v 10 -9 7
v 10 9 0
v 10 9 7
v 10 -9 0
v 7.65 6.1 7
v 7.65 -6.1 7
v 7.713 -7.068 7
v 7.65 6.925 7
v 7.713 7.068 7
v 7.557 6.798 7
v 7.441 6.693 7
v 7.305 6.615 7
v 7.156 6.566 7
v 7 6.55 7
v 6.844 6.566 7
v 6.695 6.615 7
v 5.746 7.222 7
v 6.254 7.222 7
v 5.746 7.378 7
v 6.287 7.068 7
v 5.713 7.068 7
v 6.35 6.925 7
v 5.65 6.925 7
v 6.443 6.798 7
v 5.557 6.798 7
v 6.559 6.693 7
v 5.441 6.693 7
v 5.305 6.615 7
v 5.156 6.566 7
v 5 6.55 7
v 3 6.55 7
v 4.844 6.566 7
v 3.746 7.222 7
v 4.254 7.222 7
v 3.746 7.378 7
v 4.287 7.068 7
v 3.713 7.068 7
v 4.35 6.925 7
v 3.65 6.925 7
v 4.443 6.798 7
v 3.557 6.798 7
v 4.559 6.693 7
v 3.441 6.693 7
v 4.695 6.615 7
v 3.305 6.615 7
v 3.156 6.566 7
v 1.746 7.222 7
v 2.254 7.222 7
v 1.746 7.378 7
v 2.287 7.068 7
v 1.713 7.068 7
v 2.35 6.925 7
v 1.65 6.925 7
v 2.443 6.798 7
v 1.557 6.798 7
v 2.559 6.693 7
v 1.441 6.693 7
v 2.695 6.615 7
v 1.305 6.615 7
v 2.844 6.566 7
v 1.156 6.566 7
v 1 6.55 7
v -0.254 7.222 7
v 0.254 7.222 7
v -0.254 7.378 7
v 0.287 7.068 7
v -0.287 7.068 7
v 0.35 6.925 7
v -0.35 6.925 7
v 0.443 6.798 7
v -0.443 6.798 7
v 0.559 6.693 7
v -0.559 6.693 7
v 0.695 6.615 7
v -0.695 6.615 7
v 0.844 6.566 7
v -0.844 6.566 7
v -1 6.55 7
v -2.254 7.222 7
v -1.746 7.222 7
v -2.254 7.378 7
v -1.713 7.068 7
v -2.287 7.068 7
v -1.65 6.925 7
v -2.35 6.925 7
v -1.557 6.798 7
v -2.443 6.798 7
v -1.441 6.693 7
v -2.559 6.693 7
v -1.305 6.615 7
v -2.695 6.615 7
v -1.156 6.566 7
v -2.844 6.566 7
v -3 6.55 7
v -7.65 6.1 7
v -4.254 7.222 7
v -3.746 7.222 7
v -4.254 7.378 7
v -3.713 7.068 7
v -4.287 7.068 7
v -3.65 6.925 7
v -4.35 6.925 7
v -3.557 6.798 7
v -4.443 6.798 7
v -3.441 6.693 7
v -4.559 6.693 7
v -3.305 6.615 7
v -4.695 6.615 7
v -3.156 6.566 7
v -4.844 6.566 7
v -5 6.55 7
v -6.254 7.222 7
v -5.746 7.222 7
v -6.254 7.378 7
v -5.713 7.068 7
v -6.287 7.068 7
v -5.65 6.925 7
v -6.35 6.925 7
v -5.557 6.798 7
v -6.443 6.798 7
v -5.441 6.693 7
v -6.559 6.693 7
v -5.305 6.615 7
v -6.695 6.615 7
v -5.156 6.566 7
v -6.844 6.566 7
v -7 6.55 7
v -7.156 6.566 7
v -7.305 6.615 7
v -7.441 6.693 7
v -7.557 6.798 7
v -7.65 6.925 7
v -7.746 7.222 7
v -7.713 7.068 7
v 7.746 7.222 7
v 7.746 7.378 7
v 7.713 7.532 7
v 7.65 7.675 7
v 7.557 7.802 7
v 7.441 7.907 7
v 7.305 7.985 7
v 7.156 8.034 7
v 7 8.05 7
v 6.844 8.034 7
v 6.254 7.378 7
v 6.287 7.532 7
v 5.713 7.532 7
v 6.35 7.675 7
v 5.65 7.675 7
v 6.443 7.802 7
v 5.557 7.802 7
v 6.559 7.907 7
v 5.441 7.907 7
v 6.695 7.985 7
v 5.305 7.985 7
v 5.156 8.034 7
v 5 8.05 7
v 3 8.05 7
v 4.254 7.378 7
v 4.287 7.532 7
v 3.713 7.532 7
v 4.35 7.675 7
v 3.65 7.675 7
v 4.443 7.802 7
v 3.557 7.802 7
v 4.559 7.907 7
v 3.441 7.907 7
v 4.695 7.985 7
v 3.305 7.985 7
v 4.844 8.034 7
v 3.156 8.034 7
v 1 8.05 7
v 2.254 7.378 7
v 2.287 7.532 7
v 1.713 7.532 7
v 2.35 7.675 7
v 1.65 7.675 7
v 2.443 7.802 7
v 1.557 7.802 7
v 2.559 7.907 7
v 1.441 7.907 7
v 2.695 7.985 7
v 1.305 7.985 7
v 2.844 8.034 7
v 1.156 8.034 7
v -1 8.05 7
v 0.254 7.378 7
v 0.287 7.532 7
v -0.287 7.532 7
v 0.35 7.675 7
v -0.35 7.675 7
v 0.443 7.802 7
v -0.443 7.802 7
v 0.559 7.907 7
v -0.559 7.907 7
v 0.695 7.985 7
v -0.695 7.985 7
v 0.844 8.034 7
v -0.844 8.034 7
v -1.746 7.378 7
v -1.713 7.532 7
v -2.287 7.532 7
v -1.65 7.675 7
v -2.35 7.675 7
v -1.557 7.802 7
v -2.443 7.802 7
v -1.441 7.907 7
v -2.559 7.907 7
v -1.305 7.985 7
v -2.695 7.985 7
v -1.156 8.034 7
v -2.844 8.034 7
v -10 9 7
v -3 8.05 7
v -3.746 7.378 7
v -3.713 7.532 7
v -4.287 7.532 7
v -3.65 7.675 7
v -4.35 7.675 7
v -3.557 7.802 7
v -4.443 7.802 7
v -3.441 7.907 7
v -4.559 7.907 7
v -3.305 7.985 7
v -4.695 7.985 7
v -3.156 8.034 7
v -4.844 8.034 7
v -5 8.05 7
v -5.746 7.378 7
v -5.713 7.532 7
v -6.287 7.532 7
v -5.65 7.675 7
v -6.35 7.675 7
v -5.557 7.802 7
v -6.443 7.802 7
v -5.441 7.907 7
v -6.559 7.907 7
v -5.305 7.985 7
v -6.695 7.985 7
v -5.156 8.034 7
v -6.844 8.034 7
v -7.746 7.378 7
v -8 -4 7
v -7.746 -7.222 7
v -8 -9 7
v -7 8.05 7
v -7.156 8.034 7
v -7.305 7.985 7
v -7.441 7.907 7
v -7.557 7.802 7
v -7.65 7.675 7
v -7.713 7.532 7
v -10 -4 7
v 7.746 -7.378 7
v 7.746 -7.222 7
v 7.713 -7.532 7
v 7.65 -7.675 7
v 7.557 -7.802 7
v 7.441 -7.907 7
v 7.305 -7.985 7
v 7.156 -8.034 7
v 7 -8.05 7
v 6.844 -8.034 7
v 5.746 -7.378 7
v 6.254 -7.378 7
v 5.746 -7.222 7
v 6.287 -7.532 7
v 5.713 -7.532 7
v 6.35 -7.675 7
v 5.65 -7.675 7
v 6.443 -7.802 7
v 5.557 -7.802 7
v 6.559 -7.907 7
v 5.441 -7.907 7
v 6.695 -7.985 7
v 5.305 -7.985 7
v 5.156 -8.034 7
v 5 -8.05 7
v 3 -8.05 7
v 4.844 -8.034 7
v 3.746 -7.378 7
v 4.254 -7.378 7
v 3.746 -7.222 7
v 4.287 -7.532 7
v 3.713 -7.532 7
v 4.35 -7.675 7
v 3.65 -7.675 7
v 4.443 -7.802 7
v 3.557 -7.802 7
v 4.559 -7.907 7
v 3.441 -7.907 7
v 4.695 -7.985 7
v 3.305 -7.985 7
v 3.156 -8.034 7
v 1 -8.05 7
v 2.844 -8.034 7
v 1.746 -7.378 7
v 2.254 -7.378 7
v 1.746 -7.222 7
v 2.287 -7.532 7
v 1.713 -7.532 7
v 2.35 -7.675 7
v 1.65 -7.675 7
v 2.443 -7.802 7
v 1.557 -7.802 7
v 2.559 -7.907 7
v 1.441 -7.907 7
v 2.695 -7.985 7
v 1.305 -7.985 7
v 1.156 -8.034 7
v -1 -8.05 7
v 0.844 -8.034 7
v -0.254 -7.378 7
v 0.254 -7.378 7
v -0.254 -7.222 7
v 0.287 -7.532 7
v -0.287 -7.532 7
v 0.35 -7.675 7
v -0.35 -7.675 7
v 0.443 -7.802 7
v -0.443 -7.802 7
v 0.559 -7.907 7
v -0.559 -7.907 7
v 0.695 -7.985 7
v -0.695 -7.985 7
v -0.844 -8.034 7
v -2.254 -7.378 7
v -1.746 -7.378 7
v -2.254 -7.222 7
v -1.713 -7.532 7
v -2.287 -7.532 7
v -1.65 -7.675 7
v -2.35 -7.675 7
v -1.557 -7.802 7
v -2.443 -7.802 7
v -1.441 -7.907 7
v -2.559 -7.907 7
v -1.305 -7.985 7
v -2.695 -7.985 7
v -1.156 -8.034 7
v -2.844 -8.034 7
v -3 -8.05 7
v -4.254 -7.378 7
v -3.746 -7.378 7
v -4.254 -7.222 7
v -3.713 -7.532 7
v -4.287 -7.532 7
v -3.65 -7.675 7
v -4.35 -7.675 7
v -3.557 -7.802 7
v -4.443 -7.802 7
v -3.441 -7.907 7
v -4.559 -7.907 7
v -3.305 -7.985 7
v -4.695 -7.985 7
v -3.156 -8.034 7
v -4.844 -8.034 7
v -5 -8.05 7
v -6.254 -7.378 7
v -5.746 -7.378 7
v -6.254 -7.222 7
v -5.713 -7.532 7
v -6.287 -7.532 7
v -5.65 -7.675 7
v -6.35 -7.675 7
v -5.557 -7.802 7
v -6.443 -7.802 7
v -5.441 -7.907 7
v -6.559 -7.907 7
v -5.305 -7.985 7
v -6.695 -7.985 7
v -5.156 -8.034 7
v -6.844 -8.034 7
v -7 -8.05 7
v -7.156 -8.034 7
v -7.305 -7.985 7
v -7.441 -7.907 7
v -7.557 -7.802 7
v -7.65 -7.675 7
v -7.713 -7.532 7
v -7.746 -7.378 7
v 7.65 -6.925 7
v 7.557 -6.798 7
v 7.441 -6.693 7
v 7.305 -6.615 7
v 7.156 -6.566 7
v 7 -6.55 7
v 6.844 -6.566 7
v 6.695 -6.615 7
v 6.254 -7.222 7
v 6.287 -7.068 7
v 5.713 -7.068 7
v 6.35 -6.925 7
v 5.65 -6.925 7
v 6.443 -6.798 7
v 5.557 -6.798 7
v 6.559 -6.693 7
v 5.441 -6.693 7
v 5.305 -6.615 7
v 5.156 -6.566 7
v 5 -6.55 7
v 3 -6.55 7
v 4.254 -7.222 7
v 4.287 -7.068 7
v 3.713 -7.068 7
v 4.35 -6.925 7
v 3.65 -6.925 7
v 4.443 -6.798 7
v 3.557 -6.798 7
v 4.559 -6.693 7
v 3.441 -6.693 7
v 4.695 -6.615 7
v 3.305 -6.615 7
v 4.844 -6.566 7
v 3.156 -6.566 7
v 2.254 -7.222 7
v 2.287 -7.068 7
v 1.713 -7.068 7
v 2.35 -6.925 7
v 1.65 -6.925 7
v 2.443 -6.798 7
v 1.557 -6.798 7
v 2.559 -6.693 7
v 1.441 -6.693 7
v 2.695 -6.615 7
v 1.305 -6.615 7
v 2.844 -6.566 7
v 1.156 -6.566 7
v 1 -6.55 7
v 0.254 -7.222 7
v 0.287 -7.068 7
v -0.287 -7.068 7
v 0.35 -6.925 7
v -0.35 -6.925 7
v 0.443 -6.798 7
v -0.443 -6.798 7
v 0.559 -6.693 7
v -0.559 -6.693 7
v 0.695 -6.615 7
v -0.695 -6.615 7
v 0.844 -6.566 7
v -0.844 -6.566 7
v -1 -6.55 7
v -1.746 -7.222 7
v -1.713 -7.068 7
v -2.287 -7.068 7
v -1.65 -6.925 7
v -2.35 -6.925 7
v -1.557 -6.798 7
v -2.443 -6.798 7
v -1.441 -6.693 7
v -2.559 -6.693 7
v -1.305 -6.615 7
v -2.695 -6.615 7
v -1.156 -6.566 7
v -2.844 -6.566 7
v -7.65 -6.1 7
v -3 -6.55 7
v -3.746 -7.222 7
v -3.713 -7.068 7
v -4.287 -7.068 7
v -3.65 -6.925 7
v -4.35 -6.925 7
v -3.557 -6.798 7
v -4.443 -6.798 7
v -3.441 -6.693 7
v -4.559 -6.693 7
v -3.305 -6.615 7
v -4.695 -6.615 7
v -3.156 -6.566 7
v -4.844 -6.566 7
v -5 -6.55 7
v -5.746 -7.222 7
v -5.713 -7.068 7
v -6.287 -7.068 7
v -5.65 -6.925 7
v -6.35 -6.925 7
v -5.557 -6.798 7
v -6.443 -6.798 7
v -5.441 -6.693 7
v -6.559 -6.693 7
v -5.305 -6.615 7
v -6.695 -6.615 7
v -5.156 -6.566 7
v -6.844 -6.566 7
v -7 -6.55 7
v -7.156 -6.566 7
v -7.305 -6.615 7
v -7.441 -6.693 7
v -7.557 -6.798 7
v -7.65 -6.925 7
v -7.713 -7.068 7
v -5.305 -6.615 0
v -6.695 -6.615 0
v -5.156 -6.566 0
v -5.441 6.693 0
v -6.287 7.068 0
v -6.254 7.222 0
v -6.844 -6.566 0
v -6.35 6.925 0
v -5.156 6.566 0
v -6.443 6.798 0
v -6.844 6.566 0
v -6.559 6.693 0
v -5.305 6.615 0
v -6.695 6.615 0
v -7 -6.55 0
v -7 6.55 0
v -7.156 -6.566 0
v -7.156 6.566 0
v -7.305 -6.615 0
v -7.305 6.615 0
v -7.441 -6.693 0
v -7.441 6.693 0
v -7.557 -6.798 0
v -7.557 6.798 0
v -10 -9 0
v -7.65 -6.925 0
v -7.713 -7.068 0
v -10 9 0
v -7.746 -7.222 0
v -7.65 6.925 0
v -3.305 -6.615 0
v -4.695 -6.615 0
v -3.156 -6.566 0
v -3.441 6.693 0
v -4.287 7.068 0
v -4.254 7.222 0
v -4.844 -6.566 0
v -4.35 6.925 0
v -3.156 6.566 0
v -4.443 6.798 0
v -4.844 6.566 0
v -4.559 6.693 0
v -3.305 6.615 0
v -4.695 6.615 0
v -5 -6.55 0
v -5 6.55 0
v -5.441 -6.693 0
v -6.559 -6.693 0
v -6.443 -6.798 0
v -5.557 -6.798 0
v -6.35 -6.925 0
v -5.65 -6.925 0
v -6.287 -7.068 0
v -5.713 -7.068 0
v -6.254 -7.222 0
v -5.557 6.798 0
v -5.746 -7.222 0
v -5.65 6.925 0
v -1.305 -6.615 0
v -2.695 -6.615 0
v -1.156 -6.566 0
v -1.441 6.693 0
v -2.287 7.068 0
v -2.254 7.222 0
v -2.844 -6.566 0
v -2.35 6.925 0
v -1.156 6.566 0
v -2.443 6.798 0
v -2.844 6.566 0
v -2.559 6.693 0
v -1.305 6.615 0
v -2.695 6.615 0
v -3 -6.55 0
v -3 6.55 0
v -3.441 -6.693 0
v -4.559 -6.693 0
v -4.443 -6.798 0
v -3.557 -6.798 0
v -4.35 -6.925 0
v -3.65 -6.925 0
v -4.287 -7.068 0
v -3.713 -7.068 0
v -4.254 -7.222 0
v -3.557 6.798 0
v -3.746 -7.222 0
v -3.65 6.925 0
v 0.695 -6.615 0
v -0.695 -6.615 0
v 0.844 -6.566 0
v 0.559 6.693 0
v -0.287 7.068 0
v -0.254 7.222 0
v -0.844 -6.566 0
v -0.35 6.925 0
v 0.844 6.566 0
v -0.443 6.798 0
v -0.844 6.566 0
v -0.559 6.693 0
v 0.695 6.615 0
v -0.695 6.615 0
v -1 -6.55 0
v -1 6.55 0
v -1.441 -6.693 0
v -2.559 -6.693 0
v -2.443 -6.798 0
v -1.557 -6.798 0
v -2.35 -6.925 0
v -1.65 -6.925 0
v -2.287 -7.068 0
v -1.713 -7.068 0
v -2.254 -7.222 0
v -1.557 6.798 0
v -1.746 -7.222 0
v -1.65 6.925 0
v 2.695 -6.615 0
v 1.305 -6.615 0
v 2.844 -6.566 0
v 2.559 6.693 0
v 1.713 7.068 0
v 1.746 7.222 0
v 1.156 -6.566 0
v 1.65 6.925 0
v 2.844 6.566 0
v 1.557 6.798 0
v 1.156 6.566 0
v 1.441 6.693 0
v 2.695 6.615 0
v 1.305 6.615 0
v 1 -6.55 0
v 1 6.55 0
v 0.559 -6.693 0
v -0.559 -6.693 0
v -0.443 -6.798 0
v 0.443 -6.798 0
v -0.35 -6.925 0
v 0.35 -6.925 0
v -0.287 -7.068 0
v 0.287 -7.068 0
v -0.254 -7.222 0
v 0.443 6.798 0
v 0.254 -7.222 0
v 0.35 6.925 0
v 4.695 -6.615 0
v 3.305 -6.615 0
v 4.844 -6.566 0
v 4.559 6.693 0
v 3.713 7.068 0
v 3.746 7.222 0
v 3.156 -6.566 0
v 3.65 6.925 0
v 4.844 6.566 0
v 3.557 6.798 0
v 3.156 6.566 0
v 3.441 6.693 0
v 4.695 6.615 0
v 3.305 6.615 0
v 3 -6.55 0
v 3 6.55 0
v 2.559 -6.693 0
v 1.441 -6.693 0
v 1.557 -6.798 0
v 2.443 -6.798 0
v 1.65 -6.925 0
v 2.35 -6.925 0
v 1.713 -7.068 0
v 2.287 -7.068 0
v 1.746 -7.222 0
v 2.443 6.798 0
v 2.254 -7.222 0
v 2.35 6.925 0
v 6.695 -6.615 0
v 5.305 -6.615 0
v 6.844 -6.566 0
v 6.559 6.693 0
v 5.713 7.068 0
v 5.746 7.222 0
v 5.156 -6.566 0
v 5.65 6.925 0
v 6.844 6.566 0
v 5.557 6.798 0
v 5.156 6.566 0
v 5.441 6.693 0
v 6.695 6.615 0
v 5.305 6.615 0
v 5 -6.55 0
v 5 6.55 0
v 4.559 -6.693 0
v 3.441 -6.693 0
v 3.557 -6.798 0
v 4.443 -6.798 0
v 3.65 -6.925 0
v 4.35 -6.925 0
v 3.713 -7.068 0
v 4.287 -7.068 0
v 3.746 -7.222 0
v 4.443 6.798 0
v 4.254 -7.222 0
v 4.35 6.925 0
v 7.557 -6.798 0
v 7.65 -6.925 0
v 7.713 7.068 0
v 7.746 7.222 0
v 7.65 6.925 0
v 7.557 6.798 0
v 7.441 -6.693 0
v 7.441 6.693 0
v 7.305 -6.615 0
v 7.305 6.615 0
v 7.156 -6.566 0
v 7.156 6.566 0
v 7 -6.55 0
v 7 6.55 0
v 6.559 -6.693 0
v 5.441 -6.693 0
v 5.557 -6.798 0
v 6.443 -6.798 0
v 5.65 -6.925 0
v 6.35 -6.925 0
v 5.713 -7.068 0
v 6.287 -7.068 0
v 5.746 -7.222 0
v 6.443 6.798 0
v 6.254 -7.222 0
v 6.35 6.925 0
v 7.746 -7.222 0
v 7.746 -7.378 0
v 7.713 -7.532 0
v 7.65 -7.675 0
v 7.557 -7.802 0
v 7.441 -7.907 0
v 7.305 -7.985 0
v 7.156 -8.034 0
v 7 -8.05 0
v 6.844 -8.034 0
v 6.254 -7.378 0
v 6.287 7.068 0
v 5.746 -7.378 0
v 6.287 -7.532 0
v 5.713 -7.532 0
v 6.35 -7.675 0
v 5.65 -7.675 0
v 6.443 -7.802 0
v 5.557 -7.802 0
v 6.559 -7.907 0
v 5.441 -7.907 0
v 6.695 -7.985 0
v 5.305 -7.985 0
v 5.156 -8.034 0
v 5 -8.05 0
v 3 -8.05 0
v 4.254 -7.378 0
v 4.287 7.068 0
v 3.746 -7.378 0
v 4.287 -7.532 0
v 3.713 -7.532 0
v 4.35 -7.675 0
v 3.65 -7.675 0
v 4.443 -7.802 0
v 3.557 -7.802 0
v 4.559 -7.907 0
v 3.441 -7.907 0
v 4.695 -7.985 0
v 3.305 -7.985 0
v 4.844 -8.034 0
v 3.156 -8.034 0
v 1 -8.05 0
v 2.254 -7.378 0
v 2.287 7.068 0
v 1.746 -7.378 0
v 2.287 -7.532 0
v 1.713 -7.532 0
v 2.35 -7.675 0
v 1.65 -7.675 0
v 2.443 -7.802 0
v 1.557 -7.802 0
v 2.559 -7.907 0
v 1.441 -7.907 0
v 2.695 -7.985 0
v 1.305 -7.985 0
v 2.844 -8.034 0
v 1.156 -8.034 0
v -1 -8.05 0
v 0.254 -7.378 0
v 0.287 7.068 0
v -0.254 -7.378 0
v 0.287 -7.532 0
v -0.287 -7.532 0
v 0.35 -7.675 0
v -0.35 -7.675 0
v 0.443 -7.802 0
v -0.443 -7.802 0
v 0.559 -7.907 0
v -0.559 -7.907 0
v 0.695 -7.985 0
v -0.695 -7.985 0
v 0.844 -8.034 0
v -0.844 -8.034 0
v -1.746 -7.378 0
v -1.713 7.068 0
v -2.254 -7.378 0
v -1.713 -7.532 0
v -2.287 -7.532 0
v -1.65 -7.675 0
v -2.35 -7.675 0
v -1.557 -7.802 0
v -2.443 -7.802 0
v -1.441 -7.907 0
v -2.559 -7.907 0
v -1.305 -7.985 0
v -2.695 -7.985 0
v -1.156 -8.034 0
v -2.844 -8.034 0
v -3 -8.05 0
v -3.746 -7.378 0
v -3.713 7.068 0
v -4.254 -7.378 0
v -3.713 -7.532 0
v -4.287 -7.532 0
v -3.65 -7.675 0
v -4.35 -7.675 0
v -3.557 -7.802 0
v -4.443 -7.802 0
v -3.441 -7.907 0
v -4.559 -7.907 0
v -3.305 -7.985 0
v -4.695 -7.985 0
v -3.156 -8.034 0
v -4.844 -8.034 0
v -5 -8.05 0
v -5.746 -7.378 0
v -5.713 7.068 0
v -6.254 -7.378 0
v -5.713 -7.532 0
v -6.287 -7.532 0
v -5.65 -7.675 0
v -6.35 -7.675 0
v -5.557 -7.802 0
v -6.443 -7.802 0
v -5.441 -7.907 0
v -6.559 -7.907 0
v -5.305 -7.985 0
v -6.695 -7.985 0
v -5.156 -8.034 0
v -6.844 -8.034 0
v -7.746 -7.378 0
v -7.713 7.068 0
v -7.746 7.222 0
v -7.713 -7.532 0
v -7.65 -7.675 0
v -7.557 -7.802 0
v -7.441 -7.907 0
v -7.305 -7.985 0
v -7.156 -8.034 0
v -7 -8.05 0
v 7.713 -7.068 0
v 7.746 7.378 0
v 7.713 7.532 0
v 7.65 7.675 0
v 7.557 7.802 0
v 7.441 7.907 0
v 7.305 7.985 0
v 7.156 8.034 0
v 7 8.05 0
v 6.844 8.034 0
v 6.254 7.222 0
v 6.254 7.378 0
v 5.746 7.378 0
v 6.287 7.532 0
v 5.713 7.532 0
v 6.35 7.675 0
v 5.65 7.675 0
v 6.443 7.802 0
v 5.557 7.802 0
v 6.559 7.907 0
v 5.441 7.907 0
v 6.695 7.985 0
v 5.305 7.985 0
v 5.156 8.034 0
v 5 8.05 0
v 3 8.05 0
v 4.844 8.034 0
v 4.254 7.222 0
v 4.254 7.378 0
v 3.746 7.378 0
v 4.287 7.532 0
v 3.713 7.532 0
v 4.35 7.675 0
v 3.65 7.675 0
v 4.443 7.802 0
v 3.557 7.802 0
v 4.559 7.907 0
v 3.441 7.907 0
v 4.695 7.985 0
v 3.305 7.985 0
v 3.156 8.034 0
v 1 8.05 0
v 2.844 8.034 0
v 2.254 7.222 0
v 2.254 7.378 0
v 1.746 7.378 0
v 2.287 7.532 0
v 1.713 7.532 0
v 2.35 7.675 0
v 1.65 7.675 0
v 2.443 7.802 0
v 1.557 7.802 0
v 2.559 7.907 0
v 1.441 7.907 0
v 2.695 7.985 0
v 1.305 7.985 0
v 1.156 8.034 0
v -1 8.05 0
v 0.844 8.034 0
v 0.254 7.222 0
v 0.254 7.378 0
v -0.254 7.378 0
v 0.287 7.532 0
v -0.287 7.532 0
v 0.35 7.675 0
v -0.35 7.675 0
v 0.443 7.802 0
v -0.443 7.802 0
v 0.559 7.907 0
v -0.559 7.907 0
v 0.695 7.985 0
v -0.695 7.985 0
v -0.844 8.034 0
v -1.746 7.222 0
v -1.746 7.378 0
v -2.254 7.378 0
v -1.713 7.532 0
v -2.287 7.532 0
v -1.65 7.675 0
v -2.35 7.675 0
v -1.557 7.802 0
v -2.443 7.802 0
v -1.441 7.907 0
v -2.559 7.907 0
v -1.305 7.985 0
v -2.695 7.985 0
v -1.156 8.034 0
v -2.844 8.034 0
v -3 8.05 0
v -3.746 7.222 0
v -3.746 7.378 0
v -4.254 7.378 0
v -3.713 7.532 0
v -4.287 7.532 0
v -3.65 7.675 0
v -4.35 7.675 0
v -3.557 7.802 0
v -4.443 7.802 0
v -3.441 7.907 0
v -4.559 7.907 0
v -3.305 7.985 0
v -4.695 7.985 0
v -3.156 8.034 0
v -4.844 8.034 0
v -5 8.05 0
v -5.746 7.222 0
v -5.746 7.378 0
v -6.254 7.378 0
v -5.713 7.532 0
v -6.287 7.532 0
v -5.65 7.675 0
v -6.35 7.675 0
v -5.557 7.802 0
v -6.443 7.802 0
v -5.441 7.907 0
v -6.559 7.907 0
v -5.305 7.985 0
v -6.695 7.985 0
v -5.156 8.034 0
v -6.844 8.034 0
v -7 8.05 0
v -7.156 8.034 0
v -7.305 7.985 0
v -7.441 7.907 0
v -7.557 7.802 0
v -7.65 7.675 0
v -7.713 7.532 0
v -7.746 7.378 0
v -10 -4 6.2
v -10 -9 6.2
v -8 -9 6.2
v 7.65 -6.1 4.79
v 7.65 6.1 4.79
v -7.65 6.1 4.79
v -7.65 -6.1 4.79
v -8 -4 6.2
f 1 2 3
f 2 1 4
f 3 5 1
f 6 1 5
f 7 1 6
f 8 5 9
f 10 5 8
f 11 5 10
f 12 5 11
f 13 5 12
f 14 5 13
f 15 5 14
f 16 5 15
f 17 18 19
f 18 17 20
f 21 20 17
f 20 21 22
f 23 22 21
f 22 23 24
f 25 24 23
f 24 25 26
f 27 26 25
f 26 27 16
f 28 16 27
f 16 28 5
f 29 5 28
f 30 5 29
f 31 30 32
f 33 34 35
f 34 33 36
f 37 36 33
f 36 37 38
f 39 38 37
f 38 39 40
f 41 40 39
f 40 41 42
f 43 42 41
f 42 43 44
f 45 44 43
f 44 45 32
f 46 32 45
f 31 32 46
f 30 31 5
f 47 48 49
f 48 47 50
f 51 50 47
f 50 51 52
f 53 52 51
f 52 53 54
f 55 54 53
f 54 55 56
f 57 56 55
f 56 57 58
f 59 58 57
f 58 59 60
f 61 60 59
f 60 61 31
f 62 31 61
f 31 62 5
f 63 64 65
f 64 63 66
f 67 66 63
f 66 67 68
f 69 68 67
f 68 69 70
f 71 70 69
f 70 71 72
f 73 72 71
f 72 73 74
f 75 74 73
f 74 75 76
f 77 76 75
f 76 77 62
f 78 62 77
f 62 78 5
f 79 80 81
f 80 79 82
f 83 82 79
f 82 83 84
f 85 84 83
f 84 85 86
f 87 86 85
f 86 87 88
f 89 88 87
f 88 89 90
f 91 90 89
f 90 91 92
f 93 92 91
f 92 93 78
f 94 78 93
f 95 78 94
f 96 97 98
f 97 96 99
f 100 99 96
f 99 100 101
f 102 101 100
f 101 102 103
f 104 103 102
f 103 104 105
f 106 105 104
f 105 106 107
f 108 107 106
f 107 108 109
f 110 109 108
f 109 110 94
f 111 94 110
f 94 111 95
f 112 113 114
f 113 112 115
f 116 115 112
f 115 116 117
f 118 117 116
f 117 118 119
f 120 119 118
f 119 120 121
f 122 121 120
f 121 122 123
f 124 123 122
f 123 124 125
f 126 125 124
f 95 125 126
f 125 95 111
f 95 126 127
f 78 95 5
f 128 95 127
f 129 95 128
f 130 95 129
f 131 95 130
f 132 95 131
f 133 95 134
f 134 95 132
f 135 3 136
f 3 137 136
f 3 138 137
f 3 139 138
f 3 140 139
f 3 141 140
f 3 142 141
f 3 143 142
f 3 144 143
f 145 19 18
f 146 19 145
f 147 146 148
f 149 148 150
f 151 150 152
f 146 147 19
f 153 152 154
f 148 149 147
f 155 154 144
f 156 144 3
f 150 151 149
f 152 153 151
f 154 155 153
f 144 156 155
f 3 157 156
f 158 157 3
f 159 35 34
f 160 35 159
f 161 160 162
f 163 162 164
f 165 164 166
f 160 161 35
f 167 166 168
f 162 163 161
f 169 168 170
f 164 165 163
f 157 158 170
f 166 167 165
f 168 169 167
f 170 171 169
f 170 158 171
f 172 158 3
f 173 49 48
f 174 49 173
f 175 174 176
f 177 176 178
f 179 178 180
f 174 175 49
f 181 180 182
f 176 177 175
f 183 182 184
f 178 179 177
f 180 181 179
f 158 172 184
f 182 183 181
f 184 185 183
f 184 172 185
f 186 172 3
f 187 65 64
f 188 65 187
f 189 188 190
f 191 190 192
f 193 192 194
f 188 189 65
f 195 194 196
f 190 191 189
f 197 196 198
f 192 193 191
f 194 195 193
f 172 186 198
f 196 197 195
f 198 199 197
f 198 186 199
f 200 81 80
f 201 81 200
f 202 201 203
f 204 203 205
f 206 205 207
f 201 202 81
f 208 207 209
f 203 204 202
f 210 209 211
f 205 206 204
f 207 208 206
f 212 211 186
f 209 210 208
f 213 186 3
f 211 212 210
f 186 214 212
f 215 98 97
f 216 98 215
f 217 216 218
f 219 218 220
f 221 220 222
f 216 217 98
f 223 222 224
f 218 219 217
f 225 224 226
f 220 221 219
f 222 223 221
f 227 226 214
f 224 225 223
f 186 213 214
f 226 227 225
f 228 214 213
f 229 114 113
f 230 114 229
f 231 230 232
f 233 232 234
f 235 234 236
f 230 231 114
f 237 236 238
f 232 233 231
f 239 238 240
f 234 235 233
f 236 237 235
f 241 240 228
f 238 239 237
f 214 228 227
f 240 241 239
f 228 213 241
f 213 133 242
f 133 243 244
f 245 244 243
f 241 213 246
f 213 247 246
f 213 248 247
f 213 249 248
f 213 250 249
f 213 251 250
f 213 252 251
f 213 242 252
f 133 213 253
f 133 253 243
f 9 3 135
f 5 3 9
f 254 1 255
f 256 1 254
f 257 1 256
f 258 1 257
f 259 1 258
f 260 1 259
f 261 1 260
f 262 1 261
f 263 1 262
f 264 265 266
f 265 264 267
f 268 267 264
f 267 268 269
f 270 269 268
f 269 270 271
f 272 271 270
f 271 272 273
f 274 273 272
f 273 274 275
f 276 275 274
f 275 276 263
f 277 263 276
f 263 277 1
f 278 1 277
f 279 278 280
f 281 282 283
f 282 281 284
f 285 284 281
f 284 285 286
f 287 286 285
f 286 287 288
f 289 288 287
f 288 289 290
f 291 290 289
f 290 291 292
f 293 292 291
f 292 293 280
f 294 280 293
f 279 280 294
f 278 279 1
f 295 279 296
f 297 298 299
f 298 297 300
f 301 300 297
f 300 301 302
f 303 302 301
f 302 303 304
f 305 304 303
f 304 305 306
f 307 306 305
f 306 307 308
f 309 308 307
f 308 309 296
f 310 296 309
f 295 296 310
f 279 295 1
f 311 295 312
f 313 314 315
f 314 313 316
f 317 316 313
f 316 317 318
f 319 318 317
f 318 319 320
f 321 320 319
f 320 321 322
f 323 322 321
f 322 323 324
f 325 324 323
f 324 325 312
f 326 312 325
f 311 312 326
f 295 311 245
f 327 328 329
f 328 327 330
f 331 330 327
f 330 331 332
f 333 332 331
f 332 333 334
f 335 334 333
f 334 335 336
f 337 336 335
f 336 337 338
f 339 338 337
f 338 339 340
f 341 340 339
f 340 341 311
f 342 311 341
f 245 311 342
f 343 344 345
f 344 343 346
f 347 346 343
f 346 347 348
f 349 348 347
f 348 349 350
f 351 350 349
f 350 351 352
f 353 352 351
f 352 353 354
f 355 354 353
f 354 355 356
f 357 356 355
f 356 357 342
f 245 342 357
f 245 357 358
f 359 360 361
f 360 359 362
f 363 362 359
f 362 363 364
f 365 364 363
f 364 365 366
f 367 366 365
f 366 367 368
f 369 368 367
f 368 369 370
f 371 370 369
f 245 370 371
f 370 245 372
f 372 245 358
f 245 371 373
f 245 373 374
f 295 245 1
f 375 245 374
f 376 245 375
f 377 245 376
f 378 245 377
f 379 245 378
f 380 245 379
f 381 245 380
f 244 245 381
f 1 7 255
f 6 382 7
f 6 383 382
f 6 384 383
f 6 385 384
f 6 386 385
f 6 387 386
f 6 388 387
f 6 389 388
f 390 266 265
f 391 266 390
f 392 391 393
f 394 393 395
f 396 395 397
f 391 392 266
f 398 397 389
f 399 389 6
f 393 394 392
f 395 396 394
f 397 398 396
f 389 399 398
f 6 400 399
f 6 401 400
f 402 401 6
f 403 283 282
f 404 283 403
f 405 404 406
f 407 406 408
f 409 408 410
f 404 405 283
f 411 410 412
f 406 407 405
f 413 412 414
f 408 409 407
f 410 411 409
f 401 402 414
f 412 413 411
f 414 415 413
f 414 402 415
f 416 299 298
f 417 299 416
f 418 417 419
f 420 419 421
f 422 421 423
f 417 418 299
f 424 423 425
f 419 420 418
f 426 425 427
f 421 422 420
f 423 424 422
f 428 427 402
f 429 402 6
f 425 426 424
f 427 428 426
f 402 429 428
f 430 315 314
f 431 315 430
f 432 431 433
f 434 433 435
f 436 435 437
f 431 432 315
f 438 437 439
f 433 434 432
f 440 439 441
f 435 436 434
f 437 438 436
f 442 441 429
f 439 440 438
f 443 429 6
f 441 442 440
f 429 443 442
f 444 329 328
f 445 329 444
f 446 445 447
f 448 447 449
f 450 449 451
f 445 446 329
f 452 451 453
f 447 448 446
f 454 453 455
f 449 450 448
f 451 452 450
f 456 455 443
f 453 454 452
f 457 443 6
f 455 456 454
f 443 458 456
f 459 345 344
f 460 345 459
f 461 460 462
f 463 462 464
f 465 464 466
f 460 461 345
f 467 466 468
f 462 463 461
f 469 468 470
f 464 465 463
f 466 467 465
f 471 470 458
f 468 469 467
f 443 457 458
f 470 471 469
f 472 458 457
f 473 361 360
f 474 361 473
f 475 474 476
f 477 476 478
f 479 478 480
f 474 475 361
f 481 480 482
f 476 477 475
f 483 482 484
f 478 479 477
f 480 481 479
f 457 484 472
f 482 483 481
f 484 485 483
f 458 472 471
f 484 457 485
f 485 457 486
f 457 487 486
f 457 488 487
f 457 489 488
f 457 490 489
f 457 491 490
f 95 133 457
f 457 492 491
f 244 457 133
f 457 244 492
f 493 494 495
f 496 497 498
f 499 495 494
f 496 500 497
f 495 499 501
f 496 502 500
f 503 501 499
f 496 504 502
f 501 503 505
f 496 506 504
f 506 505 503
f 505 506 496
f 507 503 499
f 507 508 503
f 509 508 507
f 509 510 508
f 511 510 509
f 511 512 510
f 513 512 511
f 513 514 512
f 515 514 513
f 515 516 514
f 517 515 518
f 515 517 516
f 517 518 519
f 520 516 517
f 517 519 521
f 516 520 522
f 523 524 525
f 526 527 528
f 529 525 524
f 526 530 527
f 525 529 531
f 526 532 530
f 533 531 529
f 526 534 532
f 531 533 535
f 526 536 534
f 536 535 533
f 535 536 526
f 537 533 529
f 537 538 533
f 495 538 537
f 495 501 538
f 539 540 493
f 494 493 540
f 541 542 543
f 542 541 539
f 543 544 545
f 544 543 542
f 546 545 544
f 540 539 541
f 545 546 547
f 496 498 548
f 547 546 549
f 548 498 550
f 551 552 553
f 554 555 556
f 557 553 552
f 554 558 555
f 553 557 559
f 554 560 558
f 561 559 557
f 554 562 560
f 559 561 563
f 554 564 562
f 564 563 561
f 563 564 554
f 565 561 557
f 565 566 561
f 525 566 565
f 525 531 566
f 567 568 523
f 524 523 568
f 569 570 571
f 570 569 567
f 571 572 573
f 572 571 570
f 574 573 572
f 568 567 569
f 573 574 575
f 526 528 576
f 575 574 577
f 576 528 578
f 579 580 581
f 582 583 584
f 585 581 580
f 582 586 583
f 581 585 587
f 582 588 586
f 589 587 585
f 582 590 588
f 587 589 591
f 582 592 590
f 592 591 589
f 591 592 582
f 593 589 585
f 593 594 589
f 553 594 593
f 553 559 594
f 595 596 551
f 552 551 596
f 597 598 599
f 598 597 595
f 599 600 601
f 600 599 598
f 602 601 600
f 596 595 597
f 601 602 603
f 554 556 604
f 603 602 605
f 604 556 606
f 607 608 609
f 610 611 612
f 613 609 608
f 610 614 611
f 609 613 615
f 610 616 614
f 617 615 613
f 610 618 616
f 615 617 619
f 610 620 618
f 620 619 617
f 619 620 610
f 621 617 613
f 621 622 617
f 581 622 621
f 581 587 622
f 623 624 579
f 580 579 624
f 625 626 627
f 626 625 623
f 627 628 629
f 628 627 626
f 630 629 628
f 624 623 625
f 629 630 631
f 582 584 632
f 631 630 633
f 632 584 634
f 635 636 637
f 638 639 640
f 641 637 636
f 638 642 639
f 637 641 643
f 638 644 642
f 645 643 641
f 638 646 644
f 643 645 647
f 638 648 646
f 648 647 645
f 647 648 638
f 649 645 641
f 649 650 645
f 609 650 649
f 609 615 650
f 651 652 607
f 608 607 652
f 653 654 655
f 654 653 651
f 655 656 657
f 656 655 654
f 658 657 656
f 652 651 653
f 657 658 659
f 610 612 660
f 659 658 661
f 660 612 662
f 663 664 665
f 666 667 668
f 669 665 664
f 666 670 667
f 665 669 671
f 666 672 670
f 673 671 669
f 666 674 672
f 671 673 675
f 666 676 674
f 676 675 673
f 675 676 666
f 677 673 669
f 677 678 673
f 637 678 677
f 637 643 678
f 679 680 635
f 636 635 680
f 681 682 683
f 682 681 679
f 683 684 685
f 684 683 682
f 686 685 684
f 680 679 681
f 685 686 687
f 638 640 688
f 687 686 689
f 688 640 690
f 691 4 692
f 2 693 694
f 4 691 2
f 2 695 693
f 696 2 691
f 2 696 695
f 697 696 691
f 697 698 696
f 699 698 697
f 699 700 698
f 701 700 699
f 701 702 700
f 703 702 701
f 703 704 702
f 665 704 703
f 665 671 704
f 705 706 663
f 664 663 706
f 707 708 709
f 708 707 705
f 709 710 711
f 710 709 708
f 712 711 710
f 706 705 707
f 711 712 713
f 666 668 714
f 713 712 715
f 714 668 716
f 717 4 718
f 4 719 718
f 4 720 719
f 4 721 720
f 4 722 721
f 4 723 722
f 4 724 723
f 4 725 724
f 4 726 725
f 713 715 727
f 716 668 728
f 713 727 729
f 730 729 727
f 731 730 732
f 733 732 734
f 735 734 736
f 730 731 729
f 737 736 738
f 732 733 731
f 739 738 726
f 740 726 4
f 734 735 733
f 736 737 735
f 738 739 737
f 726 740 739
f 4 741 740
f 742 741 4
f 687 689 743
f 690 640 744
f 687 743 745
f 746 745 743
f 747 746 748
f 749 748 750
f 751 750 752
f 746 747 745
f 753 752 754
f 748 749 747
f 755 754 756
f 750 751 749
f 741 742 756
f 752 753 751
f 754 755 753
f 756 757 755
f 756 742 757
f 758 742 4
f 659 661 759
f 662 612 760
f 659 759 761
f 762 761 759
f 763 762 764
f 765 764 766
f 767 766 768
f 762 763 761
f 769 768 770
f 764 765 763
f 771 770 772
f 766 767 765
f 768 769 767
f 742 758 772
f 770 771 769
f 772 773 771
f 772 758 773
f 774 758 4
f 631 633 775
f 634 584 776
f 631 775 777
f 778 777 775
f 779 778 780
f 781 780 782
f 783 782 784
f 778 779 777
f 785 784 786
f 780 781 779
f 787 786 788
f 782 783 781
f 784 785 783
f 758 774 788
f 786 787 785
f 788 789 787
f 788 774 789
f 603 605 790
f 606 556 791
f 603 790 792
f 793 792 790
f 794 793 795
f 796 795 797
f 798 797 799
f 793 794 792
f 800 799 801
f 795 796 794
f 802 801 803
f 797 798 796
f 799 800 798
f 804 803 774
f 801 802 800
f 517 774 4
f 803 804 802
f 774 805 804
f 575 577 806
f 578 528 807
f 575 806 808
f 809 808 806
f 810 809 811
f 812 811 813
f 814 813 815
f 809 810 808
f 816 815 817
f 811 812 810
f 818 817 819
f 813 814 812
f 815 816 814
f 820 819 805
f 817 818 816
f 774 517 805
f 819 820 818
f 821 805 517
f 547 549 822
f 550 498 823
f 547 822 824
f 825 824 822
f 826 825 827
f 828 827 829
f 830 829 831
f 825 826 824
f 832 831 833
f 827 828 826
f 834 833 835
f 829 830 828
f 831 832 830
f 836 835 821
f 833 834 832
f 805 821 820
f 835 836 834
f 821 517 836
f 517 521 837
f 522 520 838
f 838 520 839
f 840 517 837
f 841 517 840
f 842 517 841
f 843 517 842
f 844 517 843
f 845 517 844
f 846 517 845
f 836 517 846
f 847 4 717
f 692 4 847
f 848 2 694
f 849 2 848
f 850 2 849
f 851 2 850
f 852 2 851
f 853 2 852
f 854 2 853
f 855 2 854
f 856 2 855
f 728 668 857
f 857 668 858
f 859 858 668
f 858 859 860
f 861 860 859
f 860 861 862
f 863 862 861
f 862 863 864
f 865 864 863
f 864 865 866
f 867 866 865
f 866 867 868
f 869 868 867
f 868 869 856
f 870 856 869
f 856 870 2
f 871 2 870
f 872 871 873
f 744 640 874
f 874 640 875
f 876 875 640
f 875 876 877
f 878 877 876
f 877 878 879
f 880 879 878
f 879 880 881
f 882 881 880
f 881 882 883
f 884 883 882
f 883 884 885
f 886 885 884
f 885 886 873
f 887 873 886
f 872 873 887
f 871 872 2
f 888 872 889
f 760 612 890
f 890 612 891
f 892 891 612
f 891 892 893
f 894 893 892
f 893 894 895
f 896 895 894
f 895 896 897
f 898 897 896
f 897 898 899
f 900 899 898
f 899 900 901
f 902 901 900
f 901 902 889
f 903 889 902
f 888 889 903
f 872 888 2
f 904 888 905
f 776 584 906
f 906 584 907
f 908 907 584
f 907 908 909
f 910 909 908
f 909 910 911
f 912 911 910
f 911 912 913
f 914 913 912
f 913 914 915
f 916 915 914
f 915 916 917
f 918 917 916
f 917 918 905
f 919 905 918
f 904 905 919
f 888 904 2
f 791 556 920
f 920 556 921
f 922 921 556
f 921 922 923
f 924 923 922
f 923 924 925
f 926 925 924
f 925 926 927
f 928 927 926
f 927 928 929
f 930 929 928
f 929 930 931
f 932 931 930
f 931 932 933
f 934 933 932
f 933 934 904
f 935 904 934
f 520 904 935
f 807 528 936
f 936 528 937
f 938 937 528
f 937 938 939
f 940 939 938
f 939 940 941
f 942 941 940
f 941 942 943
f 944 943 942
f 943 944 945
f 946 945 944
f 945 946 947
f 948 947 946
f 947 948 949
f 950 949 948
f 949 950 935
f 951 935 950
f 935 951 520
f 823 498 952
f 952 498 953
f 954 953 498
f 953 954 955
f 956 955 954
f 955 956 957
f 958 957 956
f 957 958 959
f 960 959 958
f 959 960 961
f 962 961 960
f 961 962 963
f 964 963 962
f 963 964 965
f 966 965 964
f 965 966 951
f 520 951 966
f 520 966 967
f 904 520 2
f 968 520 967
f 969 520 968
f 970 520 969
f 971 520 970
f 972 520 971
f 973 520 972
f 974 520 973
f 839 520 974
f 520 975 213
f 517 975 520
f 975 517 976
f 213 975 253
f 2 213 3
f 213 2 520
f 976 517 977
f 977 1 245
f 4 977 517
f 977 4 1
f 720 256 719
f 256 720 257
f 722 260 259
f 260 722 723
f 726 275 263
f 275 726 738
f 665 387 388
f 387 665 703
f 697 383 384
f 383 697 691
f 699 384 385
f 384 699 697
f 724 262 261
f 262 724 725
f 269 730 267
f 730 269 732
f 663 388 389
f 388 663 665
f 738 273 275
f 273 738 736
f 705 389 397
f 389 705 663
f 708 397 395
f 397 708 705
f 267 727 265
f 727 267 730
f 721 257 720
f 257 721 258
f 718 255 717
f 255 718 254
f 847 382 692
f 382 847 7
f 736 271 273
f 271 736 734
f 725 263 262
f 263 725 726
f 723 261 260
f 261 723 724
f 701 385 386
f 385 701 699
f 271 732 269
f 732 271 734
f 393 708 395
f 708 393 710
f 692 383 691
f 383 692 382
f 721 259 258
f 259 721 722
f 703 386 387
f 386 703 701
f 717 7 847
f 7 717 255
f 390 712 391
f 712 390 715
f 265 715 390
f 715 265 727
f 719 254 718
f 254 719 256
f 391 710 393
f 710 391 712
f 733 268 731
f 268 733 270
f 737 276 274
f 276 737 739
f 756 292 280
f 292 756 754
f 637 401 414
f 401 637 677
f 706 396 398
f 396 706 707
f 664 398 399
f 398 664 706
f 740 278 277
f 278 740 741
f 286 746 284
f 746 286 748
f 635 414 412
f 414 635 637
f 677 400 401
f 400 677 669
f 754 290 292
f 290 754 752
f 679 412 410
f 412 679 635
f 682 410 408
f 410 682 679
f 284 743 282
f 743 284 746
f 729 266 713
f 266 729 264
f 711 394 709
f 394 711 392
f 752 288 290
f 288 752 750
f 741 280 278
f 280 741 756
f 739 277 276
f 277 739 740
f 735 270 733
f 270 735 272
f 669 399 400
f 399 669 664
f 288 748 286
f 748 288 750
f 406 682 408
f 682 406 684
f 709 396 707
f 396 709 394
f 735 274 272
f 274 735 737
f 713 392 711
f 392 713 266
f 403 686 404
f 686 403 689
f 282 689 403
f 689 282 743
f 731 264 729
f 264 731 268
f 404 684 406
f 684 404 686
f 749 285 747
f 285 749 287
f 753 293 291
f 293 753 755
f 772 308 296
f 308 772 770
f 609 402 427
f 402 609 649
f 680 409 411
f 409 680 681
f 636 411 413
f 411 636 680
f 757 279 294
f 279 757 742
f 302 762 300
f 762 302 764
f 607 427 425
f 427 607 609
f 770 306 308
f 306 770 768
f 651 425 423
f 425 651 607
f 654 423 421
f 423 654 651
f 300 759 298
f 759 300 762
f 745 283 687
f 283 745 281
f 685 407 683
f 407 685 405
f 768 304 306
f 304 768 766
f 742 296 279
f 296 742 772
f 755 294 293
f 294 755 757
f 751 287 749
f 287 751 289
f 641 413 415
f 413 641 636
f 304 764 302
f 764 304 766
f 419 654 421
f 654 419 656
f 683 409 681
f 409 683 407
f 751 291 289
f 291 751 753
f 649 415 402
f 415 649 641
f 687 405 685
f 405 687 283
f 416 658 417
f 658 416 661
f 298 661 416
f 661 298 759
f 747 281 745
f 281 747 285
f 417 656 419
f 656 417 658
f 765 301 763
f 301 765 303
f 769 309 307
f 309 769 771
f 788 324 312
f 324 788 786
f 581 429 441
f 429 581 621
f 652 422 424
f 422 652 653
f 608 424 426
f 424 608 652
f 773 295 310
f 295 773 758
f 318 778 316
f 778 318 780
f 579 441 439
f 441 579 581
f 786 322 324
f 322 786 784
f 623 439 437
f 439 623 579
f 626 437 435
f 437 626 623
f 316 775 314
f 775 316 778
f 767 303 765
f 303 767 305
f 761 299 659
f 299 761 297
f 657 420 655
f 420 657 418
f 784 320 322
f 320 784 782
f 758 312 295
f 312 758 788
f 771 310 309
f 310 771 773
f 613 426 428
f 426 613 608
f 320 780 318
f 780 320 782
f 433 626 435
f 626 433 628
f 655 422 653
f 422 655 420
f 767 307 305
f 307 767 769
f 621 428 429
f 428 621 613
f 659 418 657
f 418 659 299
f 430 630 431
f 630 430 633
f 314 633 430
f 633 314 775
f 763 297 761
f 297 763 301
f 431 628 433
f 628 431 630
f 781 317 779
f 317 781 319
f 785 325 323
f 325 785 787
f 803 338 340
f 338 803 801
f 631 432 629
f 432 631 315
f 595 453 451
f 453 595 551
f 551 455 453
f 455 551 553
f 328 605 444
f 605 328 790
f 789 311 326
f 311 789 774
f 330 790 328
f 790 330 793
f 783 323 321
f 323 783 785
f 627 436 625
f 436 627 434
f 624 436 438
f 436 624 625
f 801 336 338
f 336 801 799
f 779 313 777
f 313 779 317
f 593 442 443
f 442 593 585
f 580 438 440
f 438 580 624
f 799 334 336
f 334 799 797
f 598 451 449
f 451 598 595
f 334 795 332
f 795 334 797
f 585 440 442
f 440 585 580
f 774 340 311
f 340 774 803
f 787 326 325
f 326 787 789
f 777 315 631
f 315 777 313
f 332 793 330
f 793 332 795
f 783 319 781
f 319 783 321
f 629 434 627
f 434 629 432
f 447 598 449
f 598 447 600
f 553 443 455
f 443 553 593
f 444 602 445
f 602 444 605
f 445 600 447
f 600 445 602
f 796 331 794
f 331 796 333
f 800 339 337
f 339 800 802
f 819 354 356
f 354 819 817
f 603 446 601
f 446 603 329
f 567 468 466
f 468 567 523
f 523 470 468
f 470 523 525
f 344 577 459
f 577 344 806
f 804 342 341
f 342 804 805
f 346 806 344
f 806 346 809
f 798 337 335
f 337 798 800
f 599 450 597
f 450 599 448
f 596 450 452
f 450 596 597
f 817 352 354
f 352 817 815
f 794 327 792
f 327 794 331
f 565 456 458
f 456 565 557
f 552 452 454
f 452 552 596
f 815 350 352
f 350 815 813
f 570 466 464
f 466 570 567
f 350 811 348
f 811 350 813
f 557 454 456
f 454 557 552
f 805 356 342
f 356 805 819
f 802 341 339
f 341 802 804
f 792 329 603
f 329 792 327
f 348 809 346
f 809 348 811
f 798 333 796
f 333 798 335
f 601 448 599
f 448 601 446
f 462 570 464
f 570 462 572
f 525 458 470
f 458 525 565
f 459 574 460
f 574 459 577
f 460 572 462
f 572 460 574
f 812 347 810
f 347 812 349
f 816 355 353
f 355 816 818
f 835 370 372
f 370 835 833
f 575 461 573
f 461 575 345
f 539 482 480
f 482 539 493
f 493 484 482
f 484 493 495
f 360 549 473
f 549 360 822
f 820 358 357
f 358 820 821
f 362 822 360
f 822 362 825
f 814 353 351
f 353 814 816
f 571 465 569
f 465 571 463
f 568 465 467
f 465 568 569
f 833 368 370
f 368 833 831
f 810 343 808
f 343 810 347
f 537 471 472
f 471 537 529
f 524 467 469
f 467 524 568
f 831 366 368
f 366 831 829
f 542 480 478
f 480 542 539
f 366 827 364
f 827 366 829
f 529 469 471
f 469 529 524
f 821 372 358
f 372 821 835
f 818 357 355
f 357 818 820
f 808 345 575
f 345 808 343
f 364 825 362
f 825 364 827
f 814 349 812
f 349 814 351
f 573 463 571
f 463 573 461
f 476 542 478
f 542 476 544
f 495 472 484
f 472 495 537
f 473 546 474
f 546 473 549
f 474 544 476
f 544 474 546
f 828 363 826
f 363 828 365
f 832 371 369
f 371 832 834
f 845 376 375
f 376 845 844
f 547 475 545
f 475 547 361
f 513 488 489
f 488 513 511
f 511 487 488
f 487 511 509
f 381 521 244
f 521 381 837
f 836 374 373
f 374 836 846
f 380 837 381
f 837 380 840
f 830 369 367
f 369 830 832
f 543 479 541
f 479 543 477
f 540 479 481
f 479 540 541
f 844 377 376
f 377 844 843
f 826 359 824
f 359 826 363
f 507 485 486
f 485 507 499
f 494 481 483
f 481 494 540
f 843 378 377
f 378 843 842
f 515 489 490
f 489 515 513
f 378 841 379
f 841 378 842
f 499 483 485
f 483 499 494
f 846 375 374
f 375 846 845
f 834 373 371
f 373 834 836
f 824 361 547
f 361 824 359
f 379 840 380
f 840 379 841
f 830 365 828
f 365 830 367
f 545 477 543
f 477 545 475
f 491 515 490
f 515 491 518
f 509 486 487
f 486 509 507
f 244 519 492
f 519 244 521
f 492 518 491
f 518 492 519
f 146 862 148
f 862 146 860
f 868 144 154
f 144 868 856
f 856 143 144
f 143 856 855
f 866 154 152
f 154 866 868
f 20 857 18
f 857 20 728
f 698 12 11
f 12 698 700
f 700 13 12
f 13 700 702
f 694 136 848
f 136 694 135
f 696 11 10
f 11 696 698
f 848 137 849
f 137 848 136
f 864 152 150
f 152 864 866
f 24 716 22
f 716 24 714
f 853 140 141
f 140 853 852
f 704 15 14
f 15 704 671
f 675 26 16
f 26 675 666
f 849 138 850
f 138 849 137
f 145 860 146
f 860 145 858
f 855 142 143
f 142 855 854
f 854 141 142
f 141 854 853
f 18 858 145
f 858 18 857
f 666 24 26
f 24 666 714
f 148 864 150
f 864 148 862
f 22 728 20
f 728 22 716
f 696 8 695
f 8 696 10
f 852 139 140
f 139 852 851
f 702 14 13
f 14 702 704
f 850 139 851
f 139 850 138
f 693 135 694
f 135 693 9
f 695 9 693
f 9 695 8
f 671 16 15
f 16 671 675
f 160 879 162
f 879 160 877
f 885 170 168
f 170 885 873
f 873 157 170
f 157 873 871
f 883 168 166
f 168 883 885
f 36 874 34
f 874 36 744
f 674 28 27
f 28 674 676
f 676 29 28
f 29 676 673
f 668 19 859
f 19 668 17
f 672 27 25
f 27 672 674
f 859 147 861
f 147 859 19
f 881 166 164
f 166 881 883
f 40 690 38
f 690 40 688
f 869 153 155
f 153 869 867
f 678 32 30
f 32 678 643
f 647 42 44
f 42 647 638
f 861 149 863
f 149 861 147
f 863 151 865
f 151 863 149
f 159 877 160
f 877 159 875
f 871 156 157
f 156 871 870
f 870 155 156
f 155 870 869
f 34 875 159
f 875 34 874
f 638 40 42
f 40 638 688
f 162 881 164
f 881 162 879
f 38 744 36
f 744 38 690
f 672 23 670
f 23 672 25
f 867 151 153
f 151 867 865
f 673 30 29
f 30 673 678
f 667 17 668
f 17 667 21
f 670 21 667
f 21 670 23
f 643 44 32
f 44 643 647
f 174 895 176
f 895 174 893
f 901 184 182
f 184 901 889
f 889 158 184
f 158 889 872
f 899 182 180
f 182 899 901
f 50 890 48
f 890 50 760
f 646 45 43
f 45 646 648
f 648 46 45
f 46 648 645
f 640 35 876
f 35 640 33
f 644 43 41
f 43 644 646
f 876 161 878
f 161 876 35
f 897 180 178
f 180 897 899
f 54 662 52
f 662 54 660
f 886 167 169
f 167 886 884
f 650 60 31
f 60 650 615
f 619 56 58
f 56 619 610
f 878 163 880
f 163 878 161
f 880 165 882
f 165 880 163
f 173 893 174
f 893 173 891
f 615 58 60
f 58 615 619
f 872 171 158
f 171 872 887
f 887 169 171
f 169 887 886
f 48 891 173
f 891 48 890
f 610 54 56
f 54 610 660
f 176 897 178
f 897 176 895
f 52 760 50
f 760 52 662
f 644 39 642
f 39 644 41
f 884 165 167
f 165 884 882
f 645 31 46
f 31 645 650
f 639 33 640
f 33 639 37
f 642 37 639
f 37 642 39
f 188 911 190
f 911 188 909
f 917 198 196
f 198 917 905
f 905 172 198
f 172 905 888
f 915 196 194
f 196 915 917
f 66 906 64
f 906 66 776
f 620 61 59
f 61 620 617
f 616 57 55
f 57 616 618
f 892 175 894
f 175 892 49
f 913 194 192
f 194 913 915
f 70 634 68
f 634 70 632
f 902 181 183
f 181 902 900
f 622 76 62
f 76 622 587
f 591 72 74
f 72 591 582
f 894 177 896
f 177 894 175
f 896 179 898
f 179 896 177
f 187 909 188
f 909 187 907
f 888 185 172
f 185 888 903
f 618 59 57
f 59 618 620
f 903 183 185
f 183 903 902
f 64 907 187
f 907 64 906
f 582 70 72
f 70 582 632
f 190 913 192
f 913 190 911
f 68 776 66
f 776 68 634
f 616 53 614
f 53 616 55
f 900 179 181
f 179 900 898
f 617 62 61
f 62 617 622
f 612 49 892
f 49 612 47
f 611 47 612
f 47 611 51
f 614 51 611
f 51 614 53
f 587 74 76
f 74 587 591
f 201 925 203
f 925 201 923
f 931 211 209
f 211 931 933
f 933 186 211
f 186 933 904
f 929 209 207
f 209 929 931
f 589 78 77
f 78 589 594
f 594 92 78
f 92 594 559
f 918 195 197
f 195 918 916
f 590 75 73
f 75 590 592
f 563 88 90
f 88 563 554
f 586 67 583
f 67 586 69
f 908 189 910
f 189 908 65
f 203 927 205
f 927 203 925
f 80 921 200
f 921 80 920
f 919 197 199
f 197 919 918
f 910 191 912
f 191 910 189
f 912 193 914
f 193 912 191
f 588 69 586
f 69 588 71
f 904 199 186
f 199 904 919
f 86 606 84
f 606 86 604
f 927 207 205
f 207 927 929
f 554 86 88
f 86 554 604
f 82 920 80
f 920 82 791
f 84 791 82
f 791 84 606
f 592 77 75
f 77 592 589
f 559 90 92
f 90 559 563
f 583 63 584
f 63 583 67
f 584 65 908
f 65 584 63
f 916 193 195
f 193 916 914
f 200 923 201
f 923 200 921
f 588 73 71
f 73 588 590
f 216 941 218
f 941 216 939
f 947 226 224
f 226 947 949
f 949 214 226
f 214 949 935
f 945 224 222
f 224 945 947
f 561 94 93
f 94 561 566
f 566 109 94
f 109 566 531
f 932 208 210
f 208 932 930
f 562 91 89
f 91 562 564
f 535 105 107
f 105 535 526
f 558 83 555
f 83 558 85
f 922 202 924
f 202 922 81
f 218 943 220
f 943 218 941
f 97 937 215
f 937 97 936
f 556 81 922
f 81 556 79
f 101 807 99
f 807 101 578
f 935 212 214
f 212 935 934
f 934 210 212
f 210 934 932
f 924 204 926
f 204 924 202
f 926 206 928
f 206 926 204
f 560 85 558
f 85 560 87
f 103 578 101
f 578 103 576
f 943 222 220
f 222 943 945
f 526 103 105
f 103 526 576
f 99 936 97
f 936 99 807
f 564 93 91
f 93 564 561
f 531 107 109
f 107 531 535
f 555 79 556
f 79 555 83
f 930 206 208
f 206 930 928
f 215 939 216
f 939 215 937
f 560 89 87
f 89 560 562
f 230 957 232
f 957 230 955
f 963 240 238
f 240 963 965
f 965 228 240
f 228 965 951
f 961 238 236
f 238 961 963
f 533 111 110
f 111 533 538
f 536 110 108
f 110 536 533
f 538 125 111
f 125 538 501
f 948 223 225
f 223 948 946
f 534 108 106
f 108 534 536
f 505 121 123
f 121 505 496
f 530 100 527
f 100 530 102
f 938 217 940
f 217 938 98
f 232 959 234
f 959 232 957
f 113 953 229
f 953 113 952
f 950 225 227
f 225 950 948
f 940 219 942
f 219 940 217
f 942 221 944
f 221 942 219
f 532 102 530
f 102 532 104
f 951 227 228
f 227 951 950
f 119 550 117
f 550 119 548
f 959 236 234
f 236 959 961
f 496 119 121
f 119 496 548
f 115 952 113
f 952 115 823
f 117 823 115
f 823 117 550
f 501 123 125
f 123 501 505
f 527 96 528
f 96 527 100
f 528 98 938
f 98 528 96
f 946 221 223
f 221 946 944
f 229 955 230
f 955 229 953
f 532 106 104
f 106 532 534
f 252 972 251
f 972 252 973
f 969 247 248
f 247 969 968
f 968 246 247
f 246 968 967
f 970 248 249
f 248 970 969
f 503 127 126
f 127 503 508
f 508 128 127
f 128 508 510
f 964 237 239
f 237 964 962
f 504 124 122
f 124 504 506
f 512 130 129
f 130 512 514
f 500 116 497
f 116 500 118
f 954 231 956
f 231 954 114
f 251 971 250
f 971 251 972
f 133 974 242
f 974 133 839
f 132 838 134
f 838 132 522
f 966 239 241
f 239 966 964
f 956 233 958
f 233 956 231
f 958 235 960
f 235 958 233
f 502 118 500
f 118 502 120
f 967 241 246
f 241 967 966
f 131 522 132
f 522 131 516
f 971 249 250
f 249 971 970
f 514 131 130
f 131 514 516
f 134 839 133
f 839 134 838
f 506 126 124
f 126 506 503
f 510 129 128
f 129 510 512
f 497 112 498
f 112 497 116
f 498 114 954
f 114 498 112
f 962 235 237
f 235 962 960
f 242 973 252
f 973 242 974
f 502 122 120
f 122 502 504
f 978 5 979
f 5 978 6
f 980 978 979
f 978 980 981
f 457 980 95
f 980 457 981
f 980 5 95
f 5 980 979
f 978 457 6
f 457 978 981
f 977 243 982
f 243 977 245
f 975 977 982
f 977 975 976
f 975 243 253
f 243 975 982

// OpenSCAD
// file: libs/screws.scad
SCREW_SHAFT_DIA = 4.3;
SCREW_HEAD_HEIGHT = 2.54;
SCREW_HEAD_DIA = 7.9;
NUT_FLAT_TO_FLAT = 8.52;
NUT_POINT_TO_POINT = 9.68;
NUT_THICKNESS = 3.11;
FN = 60;
SCREW_OUTLINE_SCALE_FACTOR = 1.1;
NUT_SCALE_FACTOR = 1.06;
NYLON_NUT_SCALE_FACTOR = 1.02;
NUT_HEIGHT_SCALE_FACTOR = 1.1;

module rounded_cube(h, w, d, diag=3) {
    difference() {
        cube([h, w, d]);
        rounded_cube_bezel(h, w, d, diag);
    }
}

module rounded_cube_bezel(h, w, d, diag=3) {
    translate([0, w, 0]) face_bezel(w, d, diag);
    side = sqrt(diag * diag / 2);
    translate([h, w, 0]) rotate([0, 270, 0]) face_bezel(w, h, diag);
    translate([h, w, d]) rotate([0, -180, 0]) face_bezel(w, d, diag);;
    translate([0, w, d]) rotate([0, 90, 0]) face_bezel(w, h, diag);
}

module face_bezel(d1, d2, diag=3) {
    side = sqrt(diag * diag / 2);
    translate([side, 0, side]) rotate([90, 180, 0]) bezel_cutout(d1, diag);
    translate([side, -d1, (d2 - side)]) rotate([270, 180, 0]) bezel_cutout(d1, diag);
    translate([side, -side, d2]) rotate([0, 180, 0]) bezel_cutout(d2, diag);
    translate([side, -(d1 - side), d2]) rotate([0, 180, 90]) bezel_cutout(d2, diag);
}

module bezel_cutout(length, diag) {
    side = sqrt(diag * diag / 2);
    linear_extrude(length) {
      bezel_shape(side);
  }
}

module bezel_shape(side) {
      difference() {
        square(side, false);
        circle(side, $fn=40);
      }
  }

module screw(shaft_length_in) {
    shaft_length = (25.4 * shaft_length_in) + 1;
    union() {
    cylinder(SCREW_HEAD_HEIGHT, d=SCREW_HEAD_DIA, $fn=FN);
    translate([0, 0, SCREW_HEAD_HEIGHT - 1]) cylinder(shaft_length, d=SCREW_SHAFT_DIA + 0.5, $fn=FN);
    }
}

module nylon_screw(shaft_length_in) {
    shaft_length = (25.4 * shaft_length_in) + 1;
    union() {
    cylinder(SCREW_HEAD_HEIGHT, d=SCREW_HEAD_DIA, $fn=FN);
    translate([0, 0, SCREW_HEAD_HEIGHT - 1]) cylinder(shaft_length, d=SCREW_SHAFT_DIA + 0.3, $fn=FN);
    }
}

module hex_nut() {
    cylinder(NUT_THICKNESS * NUT_SCALE_FACTOR, d=NUT_POINT_TO_POINT * NUT_SCALE_FACTOR, $fn=6);
}

module nylon_hex_nut() {
    cylinder(NUT_THICKNESS * NYLON_NUT_SCALE_FACTOR, d=NUT_POINT_TO_POINT * NYLON_NUT_SCALE_FACTOR, $fn=6);
}

module hex_nut_pocket(depth) {
    rounded_cube(depth, NUT_FLAT_TO_FLAT * NUT_HEIGHT_SCALE_FACTOR, NUT_THICKNESS* NUT_SCALE_FACTOR);
}

module screw_recess(shaft_length_in) {
    scale([SCREW_OUTLINE_SCALE_FACTOR, SCREW_OUTLINE_SCALE_FACTOR, 1]) screw(shaft_length_in);
}

module test() {
    screw(2);
    translate([20, 0, 0]) nylon_screw(2);
    translate([40, 0, 0]) hex_nut();
    translate([60, 0, 0]) nylon_hex_nut(2);
}

test();
// main file
use <./libs/screws.scad>
module block() {
 hull() {
    cube([26,20.6, 0.000001], center=true);
    translate([0, 0, 4]) cube([26,22.4, 0.000001], center=true);
}
}

module pin() {
    translate([0,0, -1]) cylinder(100, d=1.0, $fn=20);
    translate([0,0, 3]) cylinder(100, d=1.9, $fn=20);
}

module rightside_pin(yangle) {
    rotate([7, yangle, 0]) union() {
        pin();
        #translate([0, -2, 0]) cylinder(10, d=1.0, $fn=20);
    }
}

module leftside_pin(yangle) {
    rotate([-7, yangle, 0]) union() {
        pin();
        #translate([0, 2, 0]) cylinder(10, d=1.0, $fn=20);
    }
}


//rightside_pin();

module espcan() {
    translate([0, 0, 2.21 / 2]) cube([15.3, 12.2, 50], center=true);
}


PIN_OFFSET = 7.3;
//rotate([180, 0, 0]) block();

module outlet() {

difference() {
block();
translate([7,-PIN_OFFSET, 0]) rightside_pin(30);
translate([5,-PIN_OFFSET, 0]) rightside_pin(21);
translate([3,-PIN_OFFSET, 0]) rightside_pin(12);
translate([1,-PIN_OFFSET, 0]) rightside_pin(5);
translate([-1,-PIN_OFFSET, 0]) rightside_pin(-5);
translate([-3,-PIN_OFFSET, 0]) rightside_pin(-12);
translate([-5,-PIN_OFFSET, 0]) rightside_pin(-21);
translate([-7,-PIN_OFFSET, 0]) rightside_pin(-30);
translate([7,PIN_OFFSET, 0]) leftside_pin(30);
translate([5,PIN_OFFSET, 0]) leftside_pin(21);
translate([3,PIN_OFFSET, 0]) leftside_pin(12);
translate([1,PIN_OFFSET, 0]) leftside_pin(5);
translate([-1,PIN_OFFSET, 0]) leftside_pin(-5);
translate([-3,PIN_OFFSET, 0]) leftside_pin(-12);
translate([-5,PIN_OFFSET, 0]) leftside_pin(-21);
translate([-7,PIN_OFFSET, 0]) leftside_pin(-30);
    espcan();
    #translate([-14, 4, -0]) cube([6, 5, 0.8]);
    //translate([-26 / 2, 7, 0]) cube([26, 2, 2]);
    //translate([-26 / 2, -9, 0]) cube([26, 2, 2]);
}
}


module straight_pin() {
    cylinder(8, d=1.5, $fn=30);
}
module pogo_outlet() {
difference() {
translate([0,0, 3.5]) cube([20, 18, 7], center=true);
#translate([7,-PIN_OFFSET, 0]) rotate([0, 0, -90]) straight_pin();
translate([5,-PIN_OFFSET, 0]) rotate([0, 0, -90]) straight_pin();
translate([3,-PIN_OFFSET, 0]) rotate([0, 0, -90]) straight_pin();
translate([1,-PIN_OFFSET, 0]) rotate([0, 0, -90]) straight_pin();
translate([-1,-PIN_OFFSET, 0]) rotate([0, 0, -90]) straight_pin();
translate([-3,-PIN_OFFSET, 0]) rotate([0, 0, -90]) straight_pin();
translate([-5,-PIN_OFFSET, 0]) rotate([0, 0, -90]) straight_pin();
translate([-7,-PIN_OFFSET, 0]) rotate([0, 0, -90]) straight_pin();
translate([7,PIN_OFFSET, 0]) rotate([0, 0, 90]) straight_pin();
translate([5,PIN_OFFSET, 0]) rotate([0, 0, 90]) straight_pin();
translate([3,PIN_OFFSET, 0]) rotate([0, 0, 90]) straight_pin();
translate([1,PIN_OFFSET, 0]) rotate([0, 0, 90]) straight_pin();
translate([-1,PIN_OFFSET, 0]) rotate([0, 0, 90]) straight_pin();
translate([-3,PIN_OFFSET, 0]) rotate([0, 0, 90]) straight_pin();
translate([-5,PIN_OFFSET, 0]) rotate([0, 0, 90]) straight_pin();
translate([-7,PIN_OFFSET, 0]) rotate([0, 0, 90]) straight_pin();
    translate([0, 0, 7 - (2.21 / 2)]) cube([15.3, 12.2, 2.21], center=true);
    #translate([-10, -9, 6.2]) cube([2, 5, 0.8]);
}
}

pogo_outlet();
//straight_pin();

module relay_clamp() {
difference() {
    translate([0,0, 4.8]) cube([92, 25, 6], center=true);
    union() {
    #translate([15, 0, -4]) union() {
    union() {
    //translate([7, 0, -40]) screw(3);
    //translate([-7, 0, -40]) screw(3);
    translate([0, -6, 0]) screw(3);
    translate([0, 6, 0]) screw(3);
    }
    translate([0, 0, 8.6]) union() {
    //translate([7, 0, 0]) hex_nut();
    //translate([-7, 0, 0]) hex_nut();
    translate([0, -6, 0]) hex_nut();
    translate([0, 6, 0]) hex_nut();
        }
    }
    translate([0, 0, -7]) union() {
    translate([40, -6, 0]) screw(3);
    translate([40, 6, 0]) screw(3);
    translate([-40, -6, 0]) screw(3);
    translate([-40, 6, 0]) screw(3);
    }
    #translate([0, 0, 4.7]) union() {
    translate([40, -6, 0]) hex_nut();
    translate([40, 6, 0]) hex_nut();
    translate([-40, -6, 0]) hex_nut();
    translate([-40, 6, 0]) hex_nut();
    }
    //translate([23.5, 0, 5]) cube([20, 10, 10], center=true);
    translate([-15, 0, 5]) cube([30, 10, 10], center=true);

}
}
}

module press_block() {
    difference() {
        translate([0,0, 4.8]) cube([22, 20, 4], center=true);
        translate([0, 6, 0]) screw(3);
        translate([0, -6, 0]) screw(3);
    }
}

//press_block();

//relay_clamp();
